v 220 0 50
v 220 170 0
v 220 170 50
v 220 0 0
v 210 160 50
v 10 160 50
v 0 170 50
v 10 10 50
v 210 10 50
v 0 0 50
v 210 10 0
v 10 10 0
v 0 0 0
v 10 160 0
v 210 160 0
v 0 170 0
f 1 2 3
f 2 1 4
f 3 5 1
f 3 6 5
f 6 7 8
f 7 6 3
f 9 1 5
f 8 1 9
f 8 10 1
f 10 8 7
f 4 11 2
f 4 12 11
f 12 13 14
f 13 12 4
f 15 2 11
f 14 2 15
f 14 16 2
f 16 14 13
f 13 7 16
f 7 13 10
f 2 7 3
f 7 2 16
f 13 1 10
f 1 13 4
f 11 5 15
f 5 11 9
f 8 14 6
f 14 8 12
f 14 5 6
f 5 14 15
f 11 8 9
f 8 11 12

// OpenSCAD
InnerX=200;
InnerY=150;
Height=50;
Wall=20;
Buffer=5;
difference()
{
  cube([InnerX+Wall,InnerY+Wall,Height]);
  translate([Wall/2,Wall/2,-Buffer]) cube([InnerX,InnerY,Height+(Buffer*2)]);
}
